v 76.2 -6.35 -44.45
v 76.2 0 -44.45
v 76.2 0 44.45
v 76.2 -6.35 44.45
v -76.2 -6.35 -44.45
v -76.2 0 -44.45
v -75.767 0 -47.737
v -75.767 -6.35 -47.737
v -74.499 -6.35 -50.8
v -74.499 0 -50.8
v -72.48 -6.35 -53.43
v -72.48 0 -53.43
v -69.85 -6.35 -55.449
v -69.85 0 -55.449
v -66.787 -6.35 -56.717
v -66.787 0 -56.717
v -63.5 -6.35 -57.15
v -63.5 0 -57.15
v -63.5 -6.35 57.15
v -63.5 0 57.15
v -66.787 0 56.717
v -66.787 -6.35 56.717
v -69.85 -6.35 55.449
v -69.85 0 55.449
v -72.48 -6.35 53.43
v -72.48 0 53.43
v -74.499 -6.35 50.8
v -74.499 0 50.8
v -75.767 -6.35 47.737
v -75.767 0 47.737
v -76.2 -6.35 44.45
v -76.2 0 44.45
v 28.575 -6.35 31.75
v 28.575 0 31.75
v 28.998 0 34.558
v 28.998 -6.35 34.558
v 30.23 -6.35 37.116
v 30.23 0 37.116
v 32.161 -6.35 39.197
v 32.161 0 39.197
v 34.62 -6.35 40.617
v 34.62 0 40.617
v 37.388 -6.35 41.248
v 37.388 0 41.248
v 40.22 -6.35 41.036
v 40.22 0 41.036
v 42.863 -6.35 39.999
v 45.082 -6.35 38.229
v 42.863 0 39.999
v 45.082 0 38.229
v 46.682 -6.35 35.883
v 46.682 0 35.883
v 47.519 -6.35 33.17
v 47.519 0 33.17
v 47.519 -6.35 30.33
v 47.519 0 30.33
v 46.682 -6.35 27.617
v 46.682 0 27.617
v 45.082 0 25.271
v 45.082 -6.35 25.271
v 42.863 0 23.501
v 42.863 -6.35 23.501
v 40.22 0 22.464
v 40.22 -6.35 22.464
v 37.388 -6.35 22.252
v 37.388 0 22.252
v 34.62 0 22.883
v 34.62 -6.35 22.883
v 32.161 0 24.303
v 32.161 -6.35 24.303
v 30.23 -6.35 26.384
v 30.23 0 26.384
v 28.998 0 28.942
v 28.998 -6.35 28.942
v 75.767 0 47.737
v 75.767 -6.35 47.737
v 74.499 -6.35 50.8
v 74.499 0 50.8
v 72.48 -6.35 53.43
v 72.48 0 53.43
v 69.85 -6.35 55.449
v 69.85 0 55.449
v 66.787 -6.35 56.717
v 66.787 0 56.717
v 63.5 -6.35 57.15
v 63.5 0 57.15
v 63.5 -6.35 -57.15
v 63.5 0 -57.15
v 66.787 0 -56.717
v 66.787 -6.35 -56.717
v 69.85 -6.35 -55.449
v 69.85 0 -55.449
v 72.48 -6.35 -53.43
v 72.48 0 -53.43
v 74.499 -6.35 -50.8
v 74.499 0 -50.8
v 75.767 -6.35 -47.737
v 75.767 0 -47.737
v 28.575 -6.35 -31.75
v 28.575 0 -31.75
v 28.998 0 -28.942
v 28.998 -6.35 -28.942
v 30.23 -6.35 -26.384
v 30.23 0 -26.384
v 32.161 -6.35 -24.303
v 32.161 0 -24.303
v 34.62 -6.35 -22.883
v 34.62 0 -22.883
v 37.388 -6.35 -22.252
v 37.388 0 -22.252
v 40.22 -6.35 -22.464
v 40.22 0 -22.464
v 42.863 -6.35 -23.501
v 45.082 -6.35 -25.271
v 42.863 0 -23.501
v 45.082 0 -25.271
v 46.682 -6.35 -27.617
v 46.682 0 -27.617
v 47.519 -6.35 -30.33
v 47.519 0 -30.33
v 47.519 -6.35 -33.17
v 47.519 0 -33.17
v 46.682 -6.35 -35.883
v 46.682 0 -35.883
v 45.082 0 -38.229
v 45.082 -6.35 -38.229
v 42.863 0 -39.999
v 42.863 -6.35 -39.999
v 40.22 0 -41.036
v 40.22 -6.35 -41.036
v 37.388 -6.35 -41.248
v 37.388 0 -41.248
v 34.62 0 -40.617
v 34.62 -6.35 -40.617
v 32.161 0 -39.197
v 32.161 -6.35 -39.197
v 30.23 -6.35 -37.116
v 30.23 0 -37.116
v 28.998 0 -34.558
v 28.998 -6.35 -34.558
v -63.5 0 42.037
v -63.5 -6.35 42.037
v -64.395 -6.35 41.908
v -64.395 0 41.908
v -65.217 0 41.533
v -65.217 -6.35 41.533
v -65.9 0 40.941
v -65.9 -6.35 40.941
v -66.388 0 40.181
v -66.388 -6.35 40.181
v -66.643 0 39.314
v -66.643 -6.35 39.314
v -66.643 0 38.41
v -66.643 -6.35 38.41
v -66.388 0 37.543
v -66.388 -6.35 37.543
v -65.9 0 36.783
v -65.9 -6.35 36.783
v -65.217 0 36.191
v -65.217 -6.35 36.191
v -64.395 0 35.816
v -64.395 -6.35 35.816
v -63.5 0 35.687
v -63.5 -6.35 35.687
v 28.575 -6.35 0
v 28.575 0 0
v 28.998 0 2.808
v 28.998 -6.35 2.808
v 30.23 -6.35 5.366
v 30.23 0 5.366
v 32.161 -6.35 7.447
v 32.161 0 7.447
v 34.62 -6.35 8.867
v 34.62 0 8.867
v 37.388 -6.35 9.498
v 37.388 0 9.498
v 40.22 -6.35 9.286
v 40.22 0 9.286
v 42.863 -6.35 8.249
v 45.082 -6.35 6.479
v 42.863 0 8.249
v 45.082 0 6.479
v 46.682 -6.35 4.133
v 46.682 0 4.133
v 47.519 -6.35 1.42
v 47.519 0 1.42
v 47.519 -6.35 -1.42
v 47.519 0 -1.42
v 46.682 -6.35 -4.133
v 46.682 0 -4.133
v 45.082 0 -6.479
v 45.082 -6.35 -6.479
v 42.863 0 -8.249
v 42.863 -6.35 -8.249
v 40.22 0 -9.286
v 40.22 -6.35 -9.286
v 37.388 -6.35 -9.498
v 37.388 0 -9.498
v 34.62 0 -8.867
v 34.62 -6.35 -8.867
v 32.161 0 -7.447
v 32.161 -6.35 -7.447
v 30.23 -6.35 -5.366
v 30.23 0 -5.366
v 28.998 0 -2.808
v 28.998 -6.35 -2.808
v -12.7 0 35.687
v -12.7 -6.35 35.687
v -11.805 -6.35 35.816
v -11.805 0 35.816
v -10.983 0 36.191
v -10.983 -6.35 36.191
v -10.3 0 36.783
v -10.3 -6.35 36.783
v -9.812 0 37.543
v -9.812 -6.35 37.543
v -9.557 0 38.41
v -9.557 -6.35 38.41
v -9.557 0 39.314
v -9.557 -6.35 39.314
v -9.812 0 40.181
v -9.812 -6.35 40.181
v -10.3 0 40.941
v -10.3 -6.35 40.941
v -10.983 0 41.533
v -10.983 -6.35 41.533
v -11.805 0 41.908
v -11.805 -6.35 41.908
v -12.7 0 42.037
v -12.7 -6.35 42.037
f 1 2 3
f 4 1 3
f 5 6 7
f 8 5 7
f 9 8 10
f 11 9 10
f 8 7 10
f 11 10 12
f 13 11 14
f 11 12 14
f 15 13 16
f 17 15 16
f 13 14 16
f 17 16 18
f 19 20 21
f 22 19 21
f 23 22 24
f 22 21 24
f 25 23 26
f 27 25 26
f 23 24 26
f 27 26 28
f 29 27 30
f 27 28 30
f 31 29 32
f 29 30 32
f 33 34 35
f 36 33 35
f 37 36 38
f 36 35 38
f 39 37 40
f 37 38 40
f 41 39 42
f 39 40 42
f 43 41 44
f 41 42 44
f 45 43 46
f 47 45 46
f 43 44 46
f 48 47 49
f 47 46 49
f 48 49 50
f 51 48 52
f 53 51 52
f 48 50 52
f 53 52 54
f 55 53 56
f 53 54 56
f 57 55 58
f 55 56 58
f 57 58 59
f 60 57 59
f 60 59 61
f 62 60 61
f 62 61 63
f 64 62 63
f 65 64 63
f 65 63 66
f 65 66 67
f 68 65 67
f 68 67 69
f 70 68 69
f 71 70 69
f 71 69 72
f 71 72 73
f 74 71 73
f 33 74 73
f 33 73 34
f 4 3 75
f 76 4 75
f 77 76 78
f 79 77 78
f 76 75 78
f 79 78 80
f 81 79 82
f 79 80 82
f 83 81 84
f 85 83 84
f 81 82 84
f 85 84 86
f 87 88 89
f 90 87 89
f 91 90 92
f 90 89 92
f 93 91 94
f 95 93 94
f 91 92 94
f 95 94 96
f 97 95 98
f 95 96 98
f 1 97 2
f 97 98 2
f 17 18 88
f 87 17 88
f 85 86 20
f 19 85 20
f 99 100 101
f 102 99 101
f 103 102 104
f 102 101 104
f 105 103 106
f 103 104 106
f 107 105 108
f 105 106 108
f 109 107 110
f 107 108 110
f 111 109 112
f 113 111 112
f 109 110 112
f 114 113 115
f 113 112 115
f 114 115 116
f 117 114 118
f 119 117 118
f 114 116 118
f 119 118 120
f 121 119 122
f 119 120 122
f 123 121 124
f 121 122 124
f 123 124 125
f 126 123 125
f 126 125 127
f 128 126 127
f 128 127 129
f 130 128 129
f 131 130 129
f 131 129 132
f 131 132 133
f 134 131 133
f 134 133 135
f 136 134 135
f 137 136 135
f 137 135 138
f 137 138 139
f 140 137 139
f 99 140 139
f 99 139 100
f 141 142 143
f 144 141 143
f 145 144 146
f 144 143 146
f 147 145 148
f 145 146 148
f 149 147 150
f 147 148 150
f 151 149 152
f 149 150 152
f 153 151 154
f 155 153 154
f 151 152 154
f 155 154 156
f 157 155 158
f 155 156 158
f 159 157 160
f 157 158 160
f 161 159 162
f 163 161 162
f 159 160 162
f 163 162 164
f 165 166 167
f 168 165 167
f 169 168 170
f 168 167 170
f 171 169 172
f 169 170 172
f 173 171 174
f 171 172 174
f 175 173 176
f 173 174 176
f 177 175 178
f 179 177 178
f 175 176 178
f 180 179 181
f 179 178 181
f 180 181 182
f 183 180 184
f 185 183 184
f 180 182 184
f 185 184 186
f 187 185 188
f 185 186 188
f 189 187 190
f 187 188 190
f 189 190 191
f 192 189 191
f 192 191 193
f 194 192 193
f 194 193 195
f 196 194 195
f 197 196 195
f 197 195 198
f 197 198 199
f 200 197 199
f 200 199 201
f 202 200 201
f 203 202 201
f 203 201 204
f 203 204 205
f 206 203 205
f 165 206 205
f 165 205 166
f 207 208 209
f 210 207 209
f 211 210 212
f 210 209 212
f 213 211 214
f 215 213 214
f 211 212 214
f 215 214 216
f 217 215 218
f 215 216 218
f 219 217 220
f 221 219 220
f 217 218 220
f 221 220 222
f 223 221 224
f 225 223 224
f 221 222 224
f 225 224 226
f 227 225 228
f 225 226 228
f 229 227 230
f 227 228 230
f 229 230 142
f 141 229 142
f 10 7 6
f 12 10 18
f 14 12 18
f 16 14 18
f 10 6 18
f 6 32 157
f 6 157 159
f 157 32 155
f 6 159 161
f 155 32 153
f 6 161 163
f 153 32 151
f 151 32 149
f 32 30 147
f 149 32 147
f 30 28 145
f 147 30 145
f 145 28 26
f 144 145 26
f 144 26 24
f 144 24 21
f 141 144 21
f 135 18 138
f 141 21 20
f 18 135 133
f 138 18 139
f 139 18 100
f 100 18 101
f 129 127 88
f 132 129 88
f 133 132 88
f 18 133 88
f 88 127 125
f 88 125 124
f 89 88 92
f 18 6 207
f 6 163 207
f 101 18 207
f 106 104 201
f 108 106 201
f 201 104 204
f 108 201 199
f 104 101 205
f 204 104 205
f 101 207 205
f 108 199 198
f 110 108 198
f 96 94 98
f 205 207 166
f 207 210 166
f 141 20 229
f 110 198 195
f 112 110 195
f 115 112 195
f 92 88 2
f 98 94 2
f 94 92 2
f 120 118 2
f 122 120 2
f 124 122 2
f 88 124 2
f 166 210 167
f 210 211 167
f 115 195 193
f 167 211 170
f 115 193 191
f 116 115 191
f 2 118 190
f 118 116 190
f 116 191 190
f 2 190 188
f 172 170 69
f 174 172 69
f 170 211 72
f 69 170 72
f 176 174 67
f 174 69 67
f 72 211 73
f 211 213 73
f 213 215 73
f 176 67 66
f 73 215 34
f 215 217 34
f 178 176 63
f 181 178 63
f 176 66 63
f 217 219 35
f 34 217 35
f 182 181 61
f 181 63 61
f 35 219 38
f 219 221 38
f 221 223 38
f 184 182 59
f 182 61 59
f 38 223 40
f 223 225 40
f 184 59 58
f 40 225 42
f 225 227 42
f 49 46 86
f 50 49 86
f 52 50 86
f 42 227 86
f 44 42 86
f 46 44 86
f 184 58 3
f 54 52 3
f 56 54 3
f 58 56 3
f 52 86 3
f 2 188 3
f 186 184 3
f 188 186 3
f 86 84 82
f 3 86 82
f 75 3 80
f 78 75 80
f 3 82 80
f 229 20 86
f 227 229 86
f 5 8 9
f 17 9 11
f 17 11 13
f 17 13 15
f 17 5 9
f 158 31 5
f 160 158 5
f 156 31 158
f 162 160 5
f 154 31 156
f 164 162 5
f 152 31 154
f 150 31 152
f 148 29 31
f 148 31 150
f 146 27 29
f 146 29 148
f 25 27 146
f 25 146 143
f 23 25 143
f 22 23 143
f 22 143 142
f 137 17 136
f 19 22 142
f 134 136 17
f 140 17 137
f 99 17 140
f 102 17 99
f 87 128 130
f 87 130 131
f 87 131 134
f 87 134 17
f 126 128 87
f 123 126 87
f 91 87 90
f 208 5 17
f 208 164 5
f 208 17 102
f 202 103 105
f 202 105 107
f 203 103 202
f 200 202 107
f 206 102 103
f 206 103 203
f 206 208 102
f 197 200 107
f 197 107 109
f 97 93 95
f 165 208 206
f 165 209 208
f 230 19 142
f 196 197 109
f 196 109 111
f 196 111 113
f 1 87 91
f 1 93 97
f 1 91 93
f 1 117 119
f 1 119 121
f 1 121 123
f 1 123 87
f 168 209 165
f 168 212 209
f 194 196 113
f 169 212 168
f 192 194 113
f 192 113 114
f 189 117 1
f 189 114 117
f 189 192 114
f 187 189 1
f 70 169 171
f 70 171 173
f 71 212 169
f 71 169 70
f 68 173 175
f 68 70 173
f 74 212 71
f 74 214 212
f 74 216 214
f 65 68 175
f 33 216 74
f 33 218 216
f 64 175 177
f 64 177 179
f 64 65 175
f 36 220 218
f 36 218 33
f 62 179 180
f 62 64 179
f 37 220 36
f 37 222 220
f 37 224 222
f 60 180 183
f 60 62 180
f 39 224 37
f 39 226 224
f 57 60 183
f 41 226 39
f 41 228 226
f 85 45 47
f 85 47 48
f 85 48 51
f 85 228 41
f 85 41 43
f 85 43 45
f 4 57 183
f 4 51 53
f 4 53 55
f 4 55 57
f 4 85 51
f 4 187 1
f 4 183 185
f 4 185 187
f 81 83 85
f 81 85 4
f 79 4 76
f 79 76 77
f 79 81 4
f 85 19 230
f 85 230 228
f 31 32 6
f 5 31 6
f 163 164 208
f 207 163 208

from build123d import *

# Parameters (mm, degrees)
F1_DEPTH = 6.35
F3_D     = 19.05
F5_DEPTH = 6.351


with BuildPart() as f1:
    # F0 (on Front) → F1 (new body)
    with BuildSketch(Plane.XZ):
        with BuildLine():
            ThreePointArc((76.2, 44.45), (72.480256, 53.430256), (63.5, 57.15))
            Line((63.5, 57.15), (-63.5, 57.15))
            ThreePointArc((-63.5, 57.15), (-72.480256, 53.430256), (-76.2, 44.45))
            Line((-76.2, 44.45), (-76.2, -44.45))
            ThreePointArc((-76.2, -44.45), (-72.480256, -53.430256), (-63.5, -57.15))
            Line((-63.5, -57.15), (63.5, -57.15))
            ThreePointArc((63.5, -57.15), (72.480256, -53.430256), (76.2, -44.45))
            Line((76.2, -44.45), (76.2, 44.45))
        make_face()
    extrude(amount=F1_DEPTH)

    # F3 (through all)
    with Locations(Plane.XZ.offset(6.35)):
        with Locations((38.1, 31.75), (38.1, 0), (38.1, -31.75)):
            Hole(F3_D / 2)

    # F4 (on face) → F5 (cut, through all)
    with BuildSketch(Plane.XZ.offset(6.35)):
        with BuildLine():
            Line((-12.7, 42.037003), (-63.5, 42.037003))
            ThreePointArc((-63.5, 42.037003), (-66.675, 38.862003), (-63.5, 35.687003))
            Line((-63.5, 35.687003), (-12.7, 35.687003))
            ThreePointArc((-12.7, 35.687003), (-9.525, 38.862003), (-12.7, 42.037003))
        make_face()
    extrude(amount=-F5_DEPTH, mode=Mode.SUBTRACT)


solid = f1.part
